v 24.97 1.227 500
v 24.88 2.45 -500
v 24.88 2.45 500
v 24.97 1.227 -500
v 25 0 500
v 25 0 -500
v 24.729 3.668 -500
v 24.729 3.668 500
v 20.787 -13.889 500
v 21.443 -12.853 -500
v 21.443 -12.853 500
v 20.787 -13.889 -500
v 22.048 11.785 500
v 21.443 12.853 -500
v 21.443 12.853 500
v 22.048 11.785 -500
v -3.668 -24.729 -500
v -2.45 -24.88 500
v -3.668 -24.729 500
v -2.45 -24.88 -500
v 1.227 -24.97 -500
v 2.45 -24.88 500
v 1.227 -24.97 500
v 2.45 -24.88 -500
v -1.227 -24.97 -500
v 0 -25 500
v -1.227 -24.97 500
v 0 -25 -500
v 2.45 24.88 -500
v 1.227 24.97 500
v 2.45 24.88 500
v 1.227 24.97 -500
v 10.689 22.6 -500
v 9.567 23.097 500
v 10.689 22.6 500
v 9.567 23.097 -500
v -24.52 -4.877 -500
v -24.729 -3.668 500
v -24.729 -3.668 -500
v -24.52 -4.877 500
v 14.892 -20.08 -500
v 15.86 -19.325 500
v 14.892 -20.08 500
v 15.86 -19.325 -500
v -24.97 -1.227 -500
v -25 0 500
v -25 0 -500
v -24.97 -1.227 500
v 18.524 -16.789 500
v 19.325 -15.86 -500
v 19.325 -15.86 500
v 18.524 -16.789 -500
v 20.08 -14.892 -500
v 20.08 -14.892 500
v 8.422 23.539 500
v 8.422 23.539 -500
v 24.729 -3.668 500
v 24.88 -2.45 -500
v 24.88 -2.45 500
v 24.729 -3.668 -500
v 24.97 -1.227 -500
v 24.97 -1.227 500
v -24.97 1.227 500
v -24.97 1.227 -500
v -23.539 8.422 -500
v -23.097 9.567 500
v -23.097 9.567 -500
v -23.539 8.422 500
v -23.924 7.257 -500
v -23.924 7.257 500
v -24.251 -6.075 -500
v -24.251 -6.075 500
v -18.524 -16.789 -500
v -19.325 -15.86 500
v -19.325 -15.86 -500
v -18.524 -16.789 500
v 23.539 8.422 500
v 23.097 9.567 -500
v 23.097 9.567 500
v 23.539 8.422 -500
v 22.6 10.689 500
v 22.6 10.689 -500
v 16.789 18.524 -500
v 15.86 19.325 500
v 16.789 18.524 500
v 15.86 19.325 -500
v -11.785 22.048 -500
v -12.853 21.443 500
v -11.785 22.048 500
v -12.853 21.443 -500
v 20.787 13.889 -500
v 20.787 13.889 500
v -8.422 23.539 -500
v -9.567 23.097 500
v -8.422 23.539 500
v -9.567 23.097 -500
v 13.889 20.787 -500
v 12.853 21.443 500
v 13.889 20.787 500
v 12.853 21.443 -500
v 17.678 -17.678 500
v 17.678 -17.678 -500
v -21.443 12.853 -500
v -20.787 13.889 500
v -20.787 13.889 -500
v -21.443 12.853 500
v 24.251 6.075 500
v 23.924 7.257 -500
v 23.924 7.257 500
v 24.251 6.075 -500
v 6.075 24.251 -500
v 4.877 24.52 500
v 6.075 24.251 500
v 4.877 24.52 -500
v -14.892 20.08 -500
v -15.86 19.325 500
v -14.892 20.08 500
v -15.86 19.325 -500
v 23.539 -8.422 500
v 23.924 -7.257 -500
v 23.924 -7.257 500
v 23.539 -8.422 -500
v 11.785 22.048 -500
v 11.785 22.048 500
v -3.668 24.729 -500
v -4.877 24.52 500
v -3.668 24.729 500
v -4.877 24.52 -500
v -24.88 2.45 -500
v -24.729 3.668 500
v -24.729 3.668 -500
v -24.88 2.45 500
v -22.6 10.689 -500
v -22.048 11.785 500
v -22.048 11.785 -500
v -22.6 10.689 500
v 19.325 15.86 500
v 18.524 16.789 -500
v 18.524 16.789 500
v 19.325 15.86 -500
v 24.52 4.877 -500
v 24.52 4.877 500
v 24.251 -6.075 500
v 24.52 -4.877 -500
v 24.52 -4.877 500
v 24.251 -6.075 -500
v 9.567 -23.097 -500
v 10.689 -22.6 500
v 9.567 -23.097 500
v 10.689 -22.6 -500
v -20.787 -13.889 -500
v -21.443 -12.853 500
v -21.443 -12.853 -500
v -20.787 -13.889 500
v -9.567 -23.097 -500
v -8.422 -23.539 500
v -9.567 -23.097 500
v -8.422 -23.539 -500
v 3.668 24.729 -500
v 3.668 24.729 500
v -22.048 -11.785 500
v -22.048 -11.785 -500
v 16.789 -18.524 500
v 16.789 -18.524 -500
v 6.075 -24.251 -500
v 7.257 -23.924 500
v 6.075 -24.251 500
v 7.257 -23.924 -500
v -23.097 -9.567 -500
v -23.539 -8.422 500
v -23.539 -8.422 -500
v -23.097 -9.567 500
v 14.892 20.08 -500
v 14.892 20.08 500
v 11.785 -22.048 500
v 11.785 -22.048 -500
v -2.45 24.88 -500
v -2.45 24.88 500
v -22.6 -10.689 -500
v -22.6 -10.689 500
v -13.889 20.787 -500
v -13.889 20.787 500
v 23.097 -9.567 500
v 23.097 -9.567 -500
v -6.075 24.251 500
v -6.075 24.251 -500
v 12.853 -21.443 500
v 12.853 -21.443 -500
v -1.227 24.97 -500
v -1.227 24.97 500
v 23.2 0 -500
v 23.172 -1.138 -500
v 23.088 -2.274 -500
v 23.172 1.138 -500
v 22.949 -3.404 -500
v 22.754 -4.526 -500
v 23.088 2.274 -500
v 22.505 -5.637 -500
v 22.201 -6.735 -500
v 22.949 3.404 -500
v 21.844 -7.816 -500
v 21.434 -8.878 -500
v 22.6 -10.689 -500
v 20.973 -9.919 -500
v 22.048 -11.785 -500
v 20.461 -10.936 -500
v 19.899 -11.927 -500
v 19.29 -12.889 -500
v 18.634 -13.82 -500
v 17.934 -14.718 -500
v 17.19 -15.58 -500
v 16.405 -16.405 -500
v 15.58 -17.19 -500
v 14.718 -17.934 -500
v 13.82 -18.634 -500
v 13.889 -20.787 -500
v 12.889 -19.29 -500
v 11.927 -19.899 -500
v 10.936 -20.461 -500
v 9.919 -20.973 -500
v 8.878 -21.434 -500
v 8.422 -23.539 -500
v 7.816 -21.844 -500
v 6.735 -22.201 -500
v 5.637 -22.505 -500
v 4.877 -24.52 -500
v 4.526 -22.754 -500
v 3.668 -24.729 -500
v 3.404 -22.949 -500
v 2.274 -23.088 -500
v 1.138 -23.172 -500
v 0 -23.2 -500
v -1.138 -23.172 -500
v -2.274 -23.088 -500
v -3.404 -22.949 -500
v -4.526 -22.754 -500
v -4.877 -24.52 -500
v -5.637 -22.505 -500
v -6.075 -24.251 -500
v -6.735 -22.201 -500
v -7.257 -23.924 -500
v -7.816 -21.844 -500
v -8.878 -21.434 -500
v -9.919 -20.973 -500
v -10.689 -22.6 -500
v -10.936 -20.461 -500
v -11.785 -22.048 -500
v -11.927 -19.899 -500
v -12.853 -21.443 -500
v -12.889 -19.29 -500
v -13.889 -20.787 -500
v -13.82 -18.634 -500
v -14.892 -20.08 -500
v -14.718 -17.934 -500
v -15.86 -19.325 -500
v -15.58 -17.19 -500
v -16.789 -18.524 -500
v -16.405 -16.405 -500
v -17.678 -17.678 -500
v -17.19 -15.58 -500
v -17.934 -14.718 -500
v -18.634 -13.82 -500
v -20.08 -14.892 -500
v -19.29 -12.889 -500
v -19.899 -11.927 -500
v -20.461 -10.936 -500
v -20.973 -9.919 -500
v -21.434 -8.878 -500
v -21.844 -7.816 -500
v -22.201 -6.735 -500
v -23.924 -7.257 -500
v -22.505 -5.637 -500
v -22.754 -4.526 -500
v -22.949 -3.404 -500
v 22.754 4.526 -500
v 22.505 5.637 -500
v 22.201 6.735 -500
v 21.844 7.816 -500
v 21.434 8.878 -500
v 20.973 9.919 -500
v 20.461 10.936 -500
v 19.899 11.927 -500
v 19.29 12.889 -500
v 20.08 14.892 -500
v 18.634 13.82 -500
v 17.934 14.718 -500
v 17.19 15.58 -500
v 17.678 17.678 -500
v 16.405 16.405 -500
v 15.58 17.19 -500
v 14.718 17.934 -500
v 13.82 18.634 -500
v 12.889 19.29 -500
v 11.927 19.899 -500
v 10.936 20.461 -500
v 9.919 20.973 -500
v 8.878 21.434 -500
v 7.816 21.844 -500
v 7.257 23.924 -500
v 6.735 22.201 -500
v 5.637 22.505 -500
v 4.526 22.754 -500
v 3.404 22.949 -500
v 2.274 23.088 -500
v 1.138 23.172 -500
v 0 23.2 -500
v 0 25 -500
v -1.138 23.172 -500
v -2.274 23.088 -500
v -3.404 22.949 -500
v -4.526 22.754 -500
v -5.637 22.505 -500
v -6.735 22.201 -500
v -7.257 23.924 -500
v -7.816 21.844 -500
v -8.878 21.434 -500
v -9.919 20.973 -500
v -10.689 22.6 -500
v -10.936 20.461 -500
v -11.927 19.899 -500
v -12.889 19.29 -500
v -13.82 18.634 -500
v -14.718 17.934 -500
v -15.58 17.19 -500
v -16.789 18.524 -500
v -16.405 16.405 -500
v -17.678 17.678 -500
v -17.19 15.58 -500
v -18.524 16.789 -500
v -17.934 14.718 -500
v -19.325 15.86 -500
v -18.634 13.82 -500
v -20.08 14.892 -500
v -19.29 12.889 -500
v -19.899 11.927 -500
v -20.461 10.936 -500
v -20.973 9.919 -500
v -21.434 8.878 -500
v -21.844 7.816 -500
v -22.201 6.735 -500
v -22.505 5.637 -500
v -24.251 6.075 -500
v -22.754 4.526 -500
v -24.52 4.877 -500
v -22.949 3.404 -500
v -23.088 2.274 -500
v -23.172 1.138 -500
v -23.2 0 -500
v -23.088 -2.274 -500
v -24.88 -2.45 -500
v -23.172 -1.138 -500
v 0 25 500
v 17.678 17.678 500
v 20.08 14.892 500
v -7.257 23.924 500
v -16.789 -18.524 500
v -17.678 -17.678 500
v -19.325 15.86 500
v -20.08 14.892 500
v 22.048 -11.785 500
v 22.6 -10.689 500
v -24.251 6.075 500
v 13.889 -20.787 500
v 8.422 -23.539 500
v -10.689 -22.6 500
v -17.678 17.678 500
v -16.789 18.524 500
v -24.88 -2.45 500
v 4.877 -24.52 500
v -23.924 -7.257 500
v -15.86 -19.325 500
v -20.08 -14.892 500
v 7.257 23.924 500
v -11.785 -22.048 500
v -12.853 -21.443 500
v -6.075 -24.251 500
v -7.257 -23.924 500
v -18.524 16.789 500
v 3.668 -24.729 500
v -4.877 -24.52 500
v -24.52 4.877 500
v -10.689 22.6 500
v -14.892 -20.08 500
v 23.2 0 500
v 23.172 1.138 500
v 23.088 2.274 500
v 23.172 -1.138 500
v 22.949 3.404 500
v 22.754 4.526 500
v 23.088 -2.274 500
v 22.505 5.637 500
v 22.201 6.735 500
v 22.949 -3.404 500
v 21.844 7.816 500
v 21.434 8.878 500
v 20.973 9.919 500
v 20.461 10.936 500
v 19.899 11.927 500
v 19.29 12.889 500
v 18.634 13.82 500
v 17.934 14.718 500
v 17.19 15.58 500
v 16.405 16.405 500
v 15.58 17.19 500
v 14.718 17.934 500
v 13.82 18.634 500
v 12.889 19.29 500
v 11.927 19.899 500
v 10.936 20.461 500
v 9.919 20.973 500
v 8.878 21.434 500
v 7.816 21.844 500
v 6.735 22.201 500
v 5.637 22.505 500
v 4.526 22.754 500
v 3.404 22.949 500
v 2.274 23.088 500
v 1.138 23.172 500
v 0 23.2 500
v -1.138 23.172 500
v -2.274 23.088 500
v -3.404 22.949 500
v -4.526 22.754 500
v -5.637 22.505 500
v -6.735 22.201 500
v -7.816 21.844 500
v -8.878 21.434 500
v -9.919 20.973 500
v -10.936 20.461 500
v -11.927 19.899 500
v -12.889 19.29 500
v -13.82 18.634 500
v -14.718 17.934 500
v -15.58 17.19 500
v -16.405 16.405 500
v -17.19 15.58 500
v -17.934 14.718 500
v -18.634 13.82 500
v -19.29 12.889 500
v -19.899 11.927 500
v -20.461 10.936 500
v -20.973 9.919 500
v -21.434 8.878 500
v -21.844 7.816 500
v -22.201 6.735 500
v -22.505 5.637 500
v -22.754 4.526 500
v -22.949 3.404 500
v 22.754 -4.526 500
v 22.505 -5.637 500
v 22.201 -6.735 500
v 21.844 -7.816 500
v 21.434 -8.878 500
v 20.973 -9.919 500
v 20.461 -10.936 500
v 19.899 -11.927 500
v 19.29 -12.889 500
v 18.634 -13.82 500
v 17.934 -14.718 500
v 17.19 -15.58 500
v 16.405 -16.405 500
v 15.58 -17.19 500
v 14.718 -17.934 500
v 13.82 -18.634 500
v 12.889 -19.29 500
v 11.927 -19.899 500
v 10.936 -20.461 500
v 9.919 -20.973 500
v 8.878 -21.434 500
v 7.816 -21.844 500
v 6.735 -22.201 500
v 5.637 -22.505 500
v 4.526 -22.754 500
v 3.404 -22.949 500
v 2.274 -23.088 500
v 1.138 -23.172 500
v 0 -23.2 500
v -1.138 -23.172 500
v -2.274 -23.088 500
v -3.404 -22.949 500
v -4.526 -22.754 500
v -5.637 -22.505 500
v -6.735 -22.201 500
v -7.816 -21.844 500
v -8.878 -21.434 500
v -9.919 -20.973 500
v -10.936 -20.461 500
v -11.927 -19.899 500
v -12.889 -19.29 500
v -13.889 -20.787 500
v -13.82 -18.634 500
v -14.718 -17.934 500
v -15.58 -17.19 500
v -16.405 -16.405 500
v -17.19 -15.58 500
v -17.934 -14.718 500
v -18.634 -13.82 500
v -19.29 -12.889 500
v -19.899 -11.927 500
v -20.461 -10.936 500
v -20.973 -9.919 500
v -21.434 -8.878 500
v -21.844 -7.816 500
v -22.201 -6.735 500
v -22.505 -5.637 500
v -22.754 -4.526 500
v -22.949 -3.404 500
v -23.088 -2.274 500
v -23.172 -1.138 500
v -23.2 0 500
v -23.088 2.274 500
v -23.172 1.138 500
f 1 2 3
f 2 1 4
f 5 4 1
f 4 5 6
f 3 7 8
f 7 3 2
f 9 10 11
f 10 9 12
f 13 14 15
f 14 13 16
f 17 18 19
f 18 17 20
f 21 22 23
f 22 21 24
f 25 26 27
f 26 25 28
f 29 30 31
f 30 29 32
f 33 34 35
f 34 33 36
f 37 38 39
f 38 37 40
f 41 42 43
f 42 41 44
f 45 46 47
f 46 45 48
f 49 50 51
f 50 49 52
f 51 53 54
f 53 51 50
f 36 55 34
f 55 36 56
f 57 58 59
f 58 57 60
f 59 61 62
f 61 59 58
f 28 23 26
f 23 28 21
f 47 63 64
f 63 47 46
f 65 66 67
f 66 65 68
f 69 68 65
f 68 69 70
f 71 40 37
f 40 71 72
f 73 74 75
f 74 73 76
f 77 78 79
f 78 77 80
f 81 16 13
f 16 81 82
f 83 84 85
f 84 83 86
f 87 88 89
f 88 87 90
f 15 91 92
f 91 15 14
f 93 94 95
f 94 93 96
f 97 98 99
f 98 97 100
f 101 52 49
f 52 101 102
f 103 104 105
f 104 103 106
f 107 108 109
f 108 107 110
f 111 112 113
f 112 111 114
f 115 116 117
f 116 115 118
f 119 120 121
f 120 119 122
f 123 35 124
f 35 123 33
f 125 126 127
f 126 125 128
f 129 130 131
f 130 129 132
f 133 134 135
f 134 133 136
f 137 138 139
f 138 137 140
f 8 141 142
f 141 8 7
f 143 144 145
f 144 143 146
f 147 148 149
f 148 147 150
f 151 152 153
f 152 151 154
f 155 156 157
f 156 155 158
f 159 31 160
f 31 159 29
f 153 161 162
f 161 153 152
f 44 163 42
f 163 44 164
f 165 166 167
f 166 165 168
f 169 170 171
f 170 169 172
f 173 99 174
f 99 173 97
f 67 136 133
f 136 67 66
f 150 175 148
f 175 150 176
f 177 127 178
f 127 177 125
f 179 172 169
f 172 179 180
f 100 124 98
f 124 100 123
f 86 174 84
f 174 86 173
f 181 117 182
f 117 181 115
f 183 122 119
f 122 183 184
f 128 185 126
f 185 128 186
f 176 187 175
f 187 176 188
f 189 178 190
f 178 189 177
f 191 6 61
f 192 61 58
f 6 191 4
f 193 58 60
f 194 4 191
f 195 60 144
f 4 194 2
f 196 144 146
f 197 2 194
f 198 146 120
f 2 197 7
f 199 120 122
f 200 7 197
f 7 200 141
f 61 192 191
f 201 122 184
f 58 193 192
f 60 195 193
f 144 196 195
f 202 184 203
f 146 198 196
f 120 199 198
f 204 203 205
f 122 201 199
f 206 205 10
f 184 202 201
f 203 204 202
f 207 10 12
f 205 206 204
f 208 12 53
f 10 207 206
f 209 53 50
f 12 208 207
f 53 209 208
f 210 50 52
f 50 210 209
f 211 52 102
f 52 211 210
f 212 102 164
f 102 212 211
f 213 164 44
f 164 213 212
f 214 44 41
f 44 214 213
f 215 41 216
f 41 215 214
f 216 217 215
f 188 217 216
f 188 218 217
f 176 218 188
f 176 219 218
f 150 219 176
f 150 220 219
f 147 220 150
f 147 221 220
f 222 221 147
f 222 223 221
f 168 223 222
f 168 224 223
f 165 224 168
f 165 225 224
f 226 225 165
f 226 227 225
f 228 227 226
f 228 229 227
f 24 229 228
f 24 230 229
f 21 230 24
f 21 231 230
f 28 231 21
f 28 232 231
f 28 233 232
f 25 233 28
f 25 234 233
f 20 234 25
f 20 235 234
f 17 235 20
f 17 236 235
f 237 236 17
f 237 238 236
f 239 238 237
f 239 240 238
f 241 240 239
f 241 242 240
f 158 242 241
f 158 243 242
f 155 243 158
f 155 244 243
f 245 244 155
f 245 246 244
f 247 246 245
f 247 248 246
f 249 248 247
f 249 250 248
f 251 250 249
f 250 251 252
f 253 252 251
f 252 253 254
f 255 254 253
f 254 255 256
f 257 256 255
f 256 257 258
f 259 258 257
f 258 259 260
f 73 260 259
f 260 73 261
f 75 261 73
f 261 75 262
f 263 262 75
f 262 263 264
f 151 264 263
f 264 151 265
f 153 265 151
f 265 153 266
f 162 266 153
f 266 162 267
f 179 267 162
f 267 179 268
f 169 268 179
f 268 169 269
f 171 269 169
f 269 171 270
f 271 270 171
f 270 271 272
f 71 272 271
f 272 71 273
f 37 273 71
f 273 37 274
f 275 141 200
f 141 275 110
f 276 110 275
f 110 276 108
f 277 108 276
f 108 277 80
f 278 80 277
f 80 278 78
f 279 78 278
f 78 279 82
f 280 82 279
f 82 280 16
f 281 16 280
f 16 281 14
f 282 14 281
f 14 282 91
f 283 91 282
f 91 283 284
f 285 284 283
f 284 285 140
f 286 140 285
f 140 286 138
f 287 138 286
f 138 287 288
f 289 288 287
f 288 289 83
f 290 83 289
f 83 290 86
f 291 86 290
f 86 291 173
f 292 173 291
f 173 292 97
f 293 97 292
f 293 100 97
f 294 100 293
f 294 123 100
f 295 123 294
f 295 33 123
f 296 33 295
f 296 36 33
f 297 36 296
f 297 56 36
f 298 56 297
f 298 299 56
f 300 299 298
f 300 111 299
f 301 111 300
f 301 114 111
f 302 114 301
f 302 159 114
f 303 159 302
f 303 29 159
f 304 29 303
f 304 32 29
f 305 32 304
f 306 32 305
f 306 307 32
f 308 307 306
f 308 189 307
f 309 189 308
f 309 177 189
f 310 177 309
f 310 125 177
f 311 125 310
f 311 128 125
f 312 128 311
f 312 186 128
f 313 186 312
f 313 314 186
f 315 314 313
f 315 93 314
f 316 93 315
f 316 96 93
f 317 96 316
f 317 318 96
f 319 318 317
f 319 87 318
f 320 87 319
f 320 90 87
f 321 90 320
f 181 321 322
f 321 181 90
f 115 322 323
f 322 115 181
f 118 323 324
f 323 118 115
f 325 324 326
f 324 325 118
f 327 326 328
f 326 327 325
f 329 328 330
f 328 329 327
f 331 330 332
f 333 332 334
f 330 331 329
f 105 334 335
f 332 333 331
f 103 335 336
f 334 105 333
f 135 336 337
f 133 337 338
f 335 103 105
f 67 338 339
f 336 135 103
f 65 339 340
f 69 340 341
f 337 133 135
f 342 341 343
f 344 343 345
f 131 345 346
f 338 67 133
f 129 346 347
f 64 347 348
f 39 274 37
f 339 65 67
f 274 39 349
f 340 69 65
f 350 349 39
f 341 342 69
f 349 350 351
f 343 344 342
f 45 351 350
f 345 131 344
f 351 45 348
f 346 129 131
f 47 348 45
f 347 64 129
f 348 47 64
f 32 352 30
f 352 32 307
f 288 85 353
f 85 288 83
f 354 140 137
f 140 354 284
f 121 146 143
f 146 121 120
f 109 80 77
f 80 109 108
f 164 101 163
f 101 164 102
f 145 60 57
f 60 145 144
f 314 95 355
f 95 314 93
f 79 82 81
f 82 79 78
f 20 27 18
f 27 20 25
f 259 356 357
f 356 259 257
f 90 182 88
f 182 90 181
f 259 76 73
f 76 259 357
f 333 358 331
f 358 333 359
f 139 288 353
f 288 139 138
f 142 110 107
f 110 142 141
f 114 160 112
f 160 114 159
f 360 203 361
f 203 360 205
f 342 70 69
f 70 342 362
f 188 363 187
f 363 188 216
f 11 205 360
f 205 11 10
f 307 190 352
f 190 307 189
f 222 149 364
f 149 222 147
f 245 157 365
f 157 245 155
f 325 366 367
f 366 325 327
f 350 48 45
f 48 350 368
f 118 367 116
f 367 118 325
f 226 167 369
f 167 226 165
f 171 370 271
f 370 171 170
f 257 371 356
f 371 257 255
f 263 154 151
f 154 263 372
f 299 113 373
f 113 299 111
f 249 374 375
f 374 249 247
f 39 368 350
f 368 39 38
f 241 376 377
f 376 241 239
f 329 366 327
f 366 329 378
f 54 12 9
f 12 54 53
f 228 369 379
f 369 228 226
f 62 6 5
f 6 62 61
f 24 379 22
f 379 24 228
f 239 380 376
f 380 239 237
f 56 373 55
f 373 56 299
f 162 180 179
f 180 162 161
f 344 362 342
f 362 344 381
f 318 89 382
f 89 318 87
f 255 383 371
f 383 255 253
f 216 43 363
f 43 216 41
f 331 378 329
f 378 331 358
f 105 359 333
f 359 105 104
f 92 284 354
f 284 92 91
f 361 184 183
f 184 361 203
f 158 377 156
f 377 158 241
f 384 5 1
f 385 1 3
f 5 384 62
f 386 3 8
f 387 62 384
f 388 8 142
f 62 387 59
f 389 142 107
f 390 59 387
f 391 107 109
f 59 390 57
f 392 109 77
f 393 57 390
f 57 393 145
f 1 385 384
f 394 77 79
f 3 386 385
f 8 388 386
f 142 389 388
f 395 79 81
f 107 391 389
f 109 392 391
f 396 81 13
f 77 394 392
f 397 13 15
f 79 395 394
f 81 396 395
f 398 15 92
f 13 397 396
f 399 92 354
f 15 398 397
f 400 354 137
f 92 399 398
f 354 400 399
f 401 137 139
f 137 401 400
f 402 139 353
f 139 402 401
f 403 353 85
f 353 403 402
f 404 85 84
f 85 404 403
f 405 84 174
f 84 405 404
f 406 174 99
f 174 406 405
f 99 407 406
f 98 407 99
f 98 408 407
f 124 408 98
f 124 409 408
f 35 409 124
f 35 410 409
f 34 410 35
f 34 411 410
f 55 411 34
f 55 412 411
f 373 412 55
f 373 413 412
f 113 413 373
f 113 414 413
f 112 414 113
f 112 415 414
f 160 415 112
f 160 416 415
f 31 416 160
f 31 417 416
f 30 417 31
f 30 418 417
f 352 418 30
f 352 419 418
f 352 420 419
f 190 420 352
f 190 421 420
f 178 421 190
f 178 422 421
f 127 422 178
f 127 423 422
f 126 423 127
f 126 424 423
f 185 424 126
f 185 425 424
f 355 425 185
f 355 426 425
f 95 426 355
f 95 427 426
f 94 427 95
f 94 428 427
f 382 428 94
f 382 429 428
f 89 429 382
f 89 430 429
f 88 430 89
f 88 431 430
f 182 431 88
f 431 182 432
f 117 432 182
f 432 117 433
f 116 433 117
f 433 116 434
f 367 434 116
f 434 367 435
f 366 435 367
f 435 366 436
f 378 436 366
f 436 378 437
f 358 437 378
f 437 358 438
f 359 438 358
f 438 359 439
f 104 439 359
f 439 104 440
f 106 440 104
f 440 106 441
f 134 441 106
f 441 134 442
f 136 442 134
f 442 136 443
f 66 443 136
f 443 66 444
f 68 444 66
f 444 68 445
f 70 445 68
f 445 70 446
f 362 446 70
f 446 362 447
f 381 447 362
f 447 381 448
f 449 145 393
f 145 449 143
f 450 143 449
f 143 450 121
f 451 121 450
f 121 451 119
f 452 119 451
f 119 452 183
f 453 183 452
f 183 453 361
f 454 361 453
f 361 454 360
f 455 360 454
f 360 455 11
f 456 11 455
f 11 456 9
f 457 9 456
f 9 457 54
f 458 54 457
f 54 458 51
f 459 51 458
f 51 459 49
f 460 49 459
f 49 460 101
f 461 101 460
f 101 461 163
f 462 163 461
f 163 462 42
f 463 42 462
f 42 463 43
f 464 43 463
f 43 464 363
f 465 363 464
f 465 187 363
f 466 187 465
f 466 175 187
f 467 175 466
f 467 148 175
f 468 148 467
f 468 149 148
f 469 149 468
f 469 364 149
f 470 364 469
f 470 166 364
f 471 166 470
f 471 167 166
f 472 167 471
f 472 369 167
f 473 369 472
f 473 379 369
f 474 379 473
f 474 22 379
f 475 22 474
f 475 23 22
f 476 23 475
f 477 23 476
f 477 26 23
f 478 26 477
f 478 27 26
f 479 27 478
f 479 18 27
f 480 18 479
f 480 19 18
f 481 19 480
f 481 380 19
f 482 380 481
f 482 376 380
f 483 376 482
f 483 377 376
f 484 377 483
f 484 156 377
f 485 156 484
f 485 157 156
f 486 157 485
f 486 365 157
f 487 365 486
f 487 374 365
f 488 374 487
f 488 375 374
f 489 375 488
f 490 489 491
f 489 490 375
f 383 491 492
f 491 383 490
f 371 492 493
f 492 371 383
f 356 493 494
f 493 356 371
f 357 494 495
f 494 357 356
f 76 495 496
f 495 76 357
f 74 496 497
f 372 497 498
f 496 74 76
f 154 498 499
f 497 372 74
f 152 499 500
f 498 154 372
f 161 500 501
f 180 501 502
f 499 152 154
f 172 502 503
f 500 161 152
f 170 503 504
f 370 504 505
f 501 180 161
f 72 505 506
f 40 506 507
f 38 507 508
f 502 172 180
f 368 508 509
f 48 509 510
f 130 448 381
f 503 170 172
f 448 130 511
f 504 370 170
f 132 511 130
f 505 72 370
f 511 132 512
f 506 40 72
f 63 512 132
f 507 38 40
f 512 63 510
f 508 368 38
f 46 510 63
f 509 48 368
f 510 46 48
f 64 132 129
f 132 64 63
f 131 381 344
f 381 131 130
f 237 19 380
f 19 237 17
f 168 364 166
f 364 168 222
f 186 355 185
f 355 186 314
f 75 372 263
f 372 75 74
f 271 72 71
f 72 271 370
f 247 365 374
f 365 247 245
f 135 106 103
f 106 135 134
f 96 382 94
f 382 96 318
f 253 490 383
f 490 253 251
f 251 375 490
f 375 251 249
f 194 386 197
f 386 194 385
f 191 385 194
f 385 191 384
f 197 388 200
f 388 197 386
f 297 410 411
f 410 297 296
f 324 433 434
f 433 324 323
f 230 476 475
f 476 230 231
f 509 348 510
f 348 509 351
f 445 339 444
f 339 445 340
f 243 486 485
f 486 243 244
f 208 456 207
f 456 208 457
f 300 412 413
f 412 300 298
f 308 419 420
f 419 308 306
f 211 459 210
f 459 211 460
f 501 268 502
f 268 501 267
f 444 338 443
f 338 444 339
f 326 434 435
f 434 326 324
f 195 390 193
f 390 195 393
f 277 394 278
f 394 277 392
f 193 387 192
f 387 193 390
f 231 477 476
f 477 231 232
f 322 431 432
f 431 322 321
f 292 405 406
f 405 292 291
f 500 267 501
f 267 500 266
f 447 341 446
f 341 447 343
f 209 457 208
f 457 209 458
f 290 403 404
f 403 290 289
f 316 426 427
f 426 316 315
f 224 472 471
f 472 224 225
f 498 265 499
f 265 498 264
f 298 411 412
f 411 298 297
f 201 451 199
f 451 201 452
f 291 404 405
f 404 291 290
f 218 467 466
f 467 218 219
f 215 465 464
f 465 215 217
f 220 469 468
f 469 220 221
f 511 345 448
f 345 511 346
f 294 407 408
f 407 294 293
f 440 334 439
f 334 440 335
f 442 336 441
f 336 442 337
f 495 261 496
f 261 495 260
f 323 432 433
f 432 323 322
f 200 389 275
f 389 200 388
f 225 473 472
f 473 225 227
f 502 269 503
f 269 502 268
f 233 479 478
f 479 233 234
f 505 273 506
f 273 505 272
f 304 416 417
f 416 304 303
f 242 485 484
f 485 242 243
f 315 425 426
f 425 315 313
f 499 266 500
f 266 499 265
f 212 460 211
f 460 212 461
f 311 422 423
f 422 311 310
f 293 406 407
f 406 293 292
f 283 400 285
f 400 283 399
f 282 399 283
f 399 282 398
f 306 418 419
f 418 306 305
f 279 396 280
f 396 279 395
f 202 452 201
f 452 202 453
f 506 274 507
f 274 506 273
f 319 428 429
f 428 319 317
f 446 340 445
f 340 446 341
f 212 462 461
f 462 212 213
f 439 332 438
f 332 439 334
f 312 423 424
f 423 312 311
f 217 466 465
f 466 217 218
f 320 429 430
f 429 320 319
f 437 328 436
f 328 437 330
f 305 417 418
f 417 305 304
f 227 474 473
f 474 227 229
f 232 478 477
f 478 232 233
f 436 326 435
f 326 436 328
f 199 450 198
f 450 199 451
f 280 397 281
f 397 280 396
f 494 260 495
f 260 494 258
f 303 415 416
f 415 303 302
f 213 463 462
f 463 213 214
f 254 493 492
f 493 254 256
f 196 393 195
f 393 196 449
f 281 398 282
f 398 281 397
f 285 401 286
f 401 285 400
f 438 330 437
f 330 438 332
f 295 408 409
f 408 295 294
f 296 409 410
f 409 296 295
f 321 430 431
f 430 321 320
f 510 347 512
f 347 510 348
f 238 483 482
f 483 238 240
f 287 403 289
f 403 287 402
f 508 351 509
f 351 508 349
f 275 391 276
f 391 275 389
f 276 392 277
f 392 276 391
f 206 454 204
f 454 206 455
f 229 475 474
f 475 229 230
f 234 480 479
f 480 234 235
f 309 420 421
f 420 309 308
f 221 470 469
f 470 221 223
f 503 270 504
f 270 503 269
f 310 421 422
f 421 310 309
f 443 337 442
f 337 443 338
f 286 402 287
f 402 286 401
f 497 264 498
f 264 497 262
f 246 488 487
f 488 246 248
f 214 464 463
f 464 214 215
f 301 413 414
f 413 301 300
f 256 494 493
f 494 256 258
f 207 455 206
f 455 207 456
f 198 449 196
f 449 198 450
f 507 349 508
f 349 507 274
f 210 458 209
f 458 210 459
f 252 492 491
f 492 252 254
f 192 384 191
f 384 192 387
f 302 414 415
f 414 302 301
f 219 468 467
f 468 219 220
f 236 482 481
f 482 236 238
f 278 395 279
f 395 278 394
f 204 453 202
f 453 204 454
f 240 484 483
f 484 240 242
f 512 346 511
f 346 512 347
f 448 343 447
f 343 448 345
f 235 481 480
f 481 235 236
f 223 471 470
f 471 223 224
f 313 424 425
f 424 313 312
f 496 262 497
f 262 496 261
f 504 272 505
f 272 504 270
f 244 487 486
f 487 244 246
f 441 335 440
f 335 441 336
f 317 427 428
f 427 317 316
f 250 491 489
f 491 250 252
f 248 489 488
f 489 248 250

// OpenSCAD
$fn=128;

module ht_pipe(od=50, wall=1.8, length=1000) {
    difference() {
        cylinder(h=length, d=od, center=true);
        cylinder(h=length+2, d=od-2*wall, center=true);
    }
}

ht_pipe(od=50, wall=1.8, length=1000);
